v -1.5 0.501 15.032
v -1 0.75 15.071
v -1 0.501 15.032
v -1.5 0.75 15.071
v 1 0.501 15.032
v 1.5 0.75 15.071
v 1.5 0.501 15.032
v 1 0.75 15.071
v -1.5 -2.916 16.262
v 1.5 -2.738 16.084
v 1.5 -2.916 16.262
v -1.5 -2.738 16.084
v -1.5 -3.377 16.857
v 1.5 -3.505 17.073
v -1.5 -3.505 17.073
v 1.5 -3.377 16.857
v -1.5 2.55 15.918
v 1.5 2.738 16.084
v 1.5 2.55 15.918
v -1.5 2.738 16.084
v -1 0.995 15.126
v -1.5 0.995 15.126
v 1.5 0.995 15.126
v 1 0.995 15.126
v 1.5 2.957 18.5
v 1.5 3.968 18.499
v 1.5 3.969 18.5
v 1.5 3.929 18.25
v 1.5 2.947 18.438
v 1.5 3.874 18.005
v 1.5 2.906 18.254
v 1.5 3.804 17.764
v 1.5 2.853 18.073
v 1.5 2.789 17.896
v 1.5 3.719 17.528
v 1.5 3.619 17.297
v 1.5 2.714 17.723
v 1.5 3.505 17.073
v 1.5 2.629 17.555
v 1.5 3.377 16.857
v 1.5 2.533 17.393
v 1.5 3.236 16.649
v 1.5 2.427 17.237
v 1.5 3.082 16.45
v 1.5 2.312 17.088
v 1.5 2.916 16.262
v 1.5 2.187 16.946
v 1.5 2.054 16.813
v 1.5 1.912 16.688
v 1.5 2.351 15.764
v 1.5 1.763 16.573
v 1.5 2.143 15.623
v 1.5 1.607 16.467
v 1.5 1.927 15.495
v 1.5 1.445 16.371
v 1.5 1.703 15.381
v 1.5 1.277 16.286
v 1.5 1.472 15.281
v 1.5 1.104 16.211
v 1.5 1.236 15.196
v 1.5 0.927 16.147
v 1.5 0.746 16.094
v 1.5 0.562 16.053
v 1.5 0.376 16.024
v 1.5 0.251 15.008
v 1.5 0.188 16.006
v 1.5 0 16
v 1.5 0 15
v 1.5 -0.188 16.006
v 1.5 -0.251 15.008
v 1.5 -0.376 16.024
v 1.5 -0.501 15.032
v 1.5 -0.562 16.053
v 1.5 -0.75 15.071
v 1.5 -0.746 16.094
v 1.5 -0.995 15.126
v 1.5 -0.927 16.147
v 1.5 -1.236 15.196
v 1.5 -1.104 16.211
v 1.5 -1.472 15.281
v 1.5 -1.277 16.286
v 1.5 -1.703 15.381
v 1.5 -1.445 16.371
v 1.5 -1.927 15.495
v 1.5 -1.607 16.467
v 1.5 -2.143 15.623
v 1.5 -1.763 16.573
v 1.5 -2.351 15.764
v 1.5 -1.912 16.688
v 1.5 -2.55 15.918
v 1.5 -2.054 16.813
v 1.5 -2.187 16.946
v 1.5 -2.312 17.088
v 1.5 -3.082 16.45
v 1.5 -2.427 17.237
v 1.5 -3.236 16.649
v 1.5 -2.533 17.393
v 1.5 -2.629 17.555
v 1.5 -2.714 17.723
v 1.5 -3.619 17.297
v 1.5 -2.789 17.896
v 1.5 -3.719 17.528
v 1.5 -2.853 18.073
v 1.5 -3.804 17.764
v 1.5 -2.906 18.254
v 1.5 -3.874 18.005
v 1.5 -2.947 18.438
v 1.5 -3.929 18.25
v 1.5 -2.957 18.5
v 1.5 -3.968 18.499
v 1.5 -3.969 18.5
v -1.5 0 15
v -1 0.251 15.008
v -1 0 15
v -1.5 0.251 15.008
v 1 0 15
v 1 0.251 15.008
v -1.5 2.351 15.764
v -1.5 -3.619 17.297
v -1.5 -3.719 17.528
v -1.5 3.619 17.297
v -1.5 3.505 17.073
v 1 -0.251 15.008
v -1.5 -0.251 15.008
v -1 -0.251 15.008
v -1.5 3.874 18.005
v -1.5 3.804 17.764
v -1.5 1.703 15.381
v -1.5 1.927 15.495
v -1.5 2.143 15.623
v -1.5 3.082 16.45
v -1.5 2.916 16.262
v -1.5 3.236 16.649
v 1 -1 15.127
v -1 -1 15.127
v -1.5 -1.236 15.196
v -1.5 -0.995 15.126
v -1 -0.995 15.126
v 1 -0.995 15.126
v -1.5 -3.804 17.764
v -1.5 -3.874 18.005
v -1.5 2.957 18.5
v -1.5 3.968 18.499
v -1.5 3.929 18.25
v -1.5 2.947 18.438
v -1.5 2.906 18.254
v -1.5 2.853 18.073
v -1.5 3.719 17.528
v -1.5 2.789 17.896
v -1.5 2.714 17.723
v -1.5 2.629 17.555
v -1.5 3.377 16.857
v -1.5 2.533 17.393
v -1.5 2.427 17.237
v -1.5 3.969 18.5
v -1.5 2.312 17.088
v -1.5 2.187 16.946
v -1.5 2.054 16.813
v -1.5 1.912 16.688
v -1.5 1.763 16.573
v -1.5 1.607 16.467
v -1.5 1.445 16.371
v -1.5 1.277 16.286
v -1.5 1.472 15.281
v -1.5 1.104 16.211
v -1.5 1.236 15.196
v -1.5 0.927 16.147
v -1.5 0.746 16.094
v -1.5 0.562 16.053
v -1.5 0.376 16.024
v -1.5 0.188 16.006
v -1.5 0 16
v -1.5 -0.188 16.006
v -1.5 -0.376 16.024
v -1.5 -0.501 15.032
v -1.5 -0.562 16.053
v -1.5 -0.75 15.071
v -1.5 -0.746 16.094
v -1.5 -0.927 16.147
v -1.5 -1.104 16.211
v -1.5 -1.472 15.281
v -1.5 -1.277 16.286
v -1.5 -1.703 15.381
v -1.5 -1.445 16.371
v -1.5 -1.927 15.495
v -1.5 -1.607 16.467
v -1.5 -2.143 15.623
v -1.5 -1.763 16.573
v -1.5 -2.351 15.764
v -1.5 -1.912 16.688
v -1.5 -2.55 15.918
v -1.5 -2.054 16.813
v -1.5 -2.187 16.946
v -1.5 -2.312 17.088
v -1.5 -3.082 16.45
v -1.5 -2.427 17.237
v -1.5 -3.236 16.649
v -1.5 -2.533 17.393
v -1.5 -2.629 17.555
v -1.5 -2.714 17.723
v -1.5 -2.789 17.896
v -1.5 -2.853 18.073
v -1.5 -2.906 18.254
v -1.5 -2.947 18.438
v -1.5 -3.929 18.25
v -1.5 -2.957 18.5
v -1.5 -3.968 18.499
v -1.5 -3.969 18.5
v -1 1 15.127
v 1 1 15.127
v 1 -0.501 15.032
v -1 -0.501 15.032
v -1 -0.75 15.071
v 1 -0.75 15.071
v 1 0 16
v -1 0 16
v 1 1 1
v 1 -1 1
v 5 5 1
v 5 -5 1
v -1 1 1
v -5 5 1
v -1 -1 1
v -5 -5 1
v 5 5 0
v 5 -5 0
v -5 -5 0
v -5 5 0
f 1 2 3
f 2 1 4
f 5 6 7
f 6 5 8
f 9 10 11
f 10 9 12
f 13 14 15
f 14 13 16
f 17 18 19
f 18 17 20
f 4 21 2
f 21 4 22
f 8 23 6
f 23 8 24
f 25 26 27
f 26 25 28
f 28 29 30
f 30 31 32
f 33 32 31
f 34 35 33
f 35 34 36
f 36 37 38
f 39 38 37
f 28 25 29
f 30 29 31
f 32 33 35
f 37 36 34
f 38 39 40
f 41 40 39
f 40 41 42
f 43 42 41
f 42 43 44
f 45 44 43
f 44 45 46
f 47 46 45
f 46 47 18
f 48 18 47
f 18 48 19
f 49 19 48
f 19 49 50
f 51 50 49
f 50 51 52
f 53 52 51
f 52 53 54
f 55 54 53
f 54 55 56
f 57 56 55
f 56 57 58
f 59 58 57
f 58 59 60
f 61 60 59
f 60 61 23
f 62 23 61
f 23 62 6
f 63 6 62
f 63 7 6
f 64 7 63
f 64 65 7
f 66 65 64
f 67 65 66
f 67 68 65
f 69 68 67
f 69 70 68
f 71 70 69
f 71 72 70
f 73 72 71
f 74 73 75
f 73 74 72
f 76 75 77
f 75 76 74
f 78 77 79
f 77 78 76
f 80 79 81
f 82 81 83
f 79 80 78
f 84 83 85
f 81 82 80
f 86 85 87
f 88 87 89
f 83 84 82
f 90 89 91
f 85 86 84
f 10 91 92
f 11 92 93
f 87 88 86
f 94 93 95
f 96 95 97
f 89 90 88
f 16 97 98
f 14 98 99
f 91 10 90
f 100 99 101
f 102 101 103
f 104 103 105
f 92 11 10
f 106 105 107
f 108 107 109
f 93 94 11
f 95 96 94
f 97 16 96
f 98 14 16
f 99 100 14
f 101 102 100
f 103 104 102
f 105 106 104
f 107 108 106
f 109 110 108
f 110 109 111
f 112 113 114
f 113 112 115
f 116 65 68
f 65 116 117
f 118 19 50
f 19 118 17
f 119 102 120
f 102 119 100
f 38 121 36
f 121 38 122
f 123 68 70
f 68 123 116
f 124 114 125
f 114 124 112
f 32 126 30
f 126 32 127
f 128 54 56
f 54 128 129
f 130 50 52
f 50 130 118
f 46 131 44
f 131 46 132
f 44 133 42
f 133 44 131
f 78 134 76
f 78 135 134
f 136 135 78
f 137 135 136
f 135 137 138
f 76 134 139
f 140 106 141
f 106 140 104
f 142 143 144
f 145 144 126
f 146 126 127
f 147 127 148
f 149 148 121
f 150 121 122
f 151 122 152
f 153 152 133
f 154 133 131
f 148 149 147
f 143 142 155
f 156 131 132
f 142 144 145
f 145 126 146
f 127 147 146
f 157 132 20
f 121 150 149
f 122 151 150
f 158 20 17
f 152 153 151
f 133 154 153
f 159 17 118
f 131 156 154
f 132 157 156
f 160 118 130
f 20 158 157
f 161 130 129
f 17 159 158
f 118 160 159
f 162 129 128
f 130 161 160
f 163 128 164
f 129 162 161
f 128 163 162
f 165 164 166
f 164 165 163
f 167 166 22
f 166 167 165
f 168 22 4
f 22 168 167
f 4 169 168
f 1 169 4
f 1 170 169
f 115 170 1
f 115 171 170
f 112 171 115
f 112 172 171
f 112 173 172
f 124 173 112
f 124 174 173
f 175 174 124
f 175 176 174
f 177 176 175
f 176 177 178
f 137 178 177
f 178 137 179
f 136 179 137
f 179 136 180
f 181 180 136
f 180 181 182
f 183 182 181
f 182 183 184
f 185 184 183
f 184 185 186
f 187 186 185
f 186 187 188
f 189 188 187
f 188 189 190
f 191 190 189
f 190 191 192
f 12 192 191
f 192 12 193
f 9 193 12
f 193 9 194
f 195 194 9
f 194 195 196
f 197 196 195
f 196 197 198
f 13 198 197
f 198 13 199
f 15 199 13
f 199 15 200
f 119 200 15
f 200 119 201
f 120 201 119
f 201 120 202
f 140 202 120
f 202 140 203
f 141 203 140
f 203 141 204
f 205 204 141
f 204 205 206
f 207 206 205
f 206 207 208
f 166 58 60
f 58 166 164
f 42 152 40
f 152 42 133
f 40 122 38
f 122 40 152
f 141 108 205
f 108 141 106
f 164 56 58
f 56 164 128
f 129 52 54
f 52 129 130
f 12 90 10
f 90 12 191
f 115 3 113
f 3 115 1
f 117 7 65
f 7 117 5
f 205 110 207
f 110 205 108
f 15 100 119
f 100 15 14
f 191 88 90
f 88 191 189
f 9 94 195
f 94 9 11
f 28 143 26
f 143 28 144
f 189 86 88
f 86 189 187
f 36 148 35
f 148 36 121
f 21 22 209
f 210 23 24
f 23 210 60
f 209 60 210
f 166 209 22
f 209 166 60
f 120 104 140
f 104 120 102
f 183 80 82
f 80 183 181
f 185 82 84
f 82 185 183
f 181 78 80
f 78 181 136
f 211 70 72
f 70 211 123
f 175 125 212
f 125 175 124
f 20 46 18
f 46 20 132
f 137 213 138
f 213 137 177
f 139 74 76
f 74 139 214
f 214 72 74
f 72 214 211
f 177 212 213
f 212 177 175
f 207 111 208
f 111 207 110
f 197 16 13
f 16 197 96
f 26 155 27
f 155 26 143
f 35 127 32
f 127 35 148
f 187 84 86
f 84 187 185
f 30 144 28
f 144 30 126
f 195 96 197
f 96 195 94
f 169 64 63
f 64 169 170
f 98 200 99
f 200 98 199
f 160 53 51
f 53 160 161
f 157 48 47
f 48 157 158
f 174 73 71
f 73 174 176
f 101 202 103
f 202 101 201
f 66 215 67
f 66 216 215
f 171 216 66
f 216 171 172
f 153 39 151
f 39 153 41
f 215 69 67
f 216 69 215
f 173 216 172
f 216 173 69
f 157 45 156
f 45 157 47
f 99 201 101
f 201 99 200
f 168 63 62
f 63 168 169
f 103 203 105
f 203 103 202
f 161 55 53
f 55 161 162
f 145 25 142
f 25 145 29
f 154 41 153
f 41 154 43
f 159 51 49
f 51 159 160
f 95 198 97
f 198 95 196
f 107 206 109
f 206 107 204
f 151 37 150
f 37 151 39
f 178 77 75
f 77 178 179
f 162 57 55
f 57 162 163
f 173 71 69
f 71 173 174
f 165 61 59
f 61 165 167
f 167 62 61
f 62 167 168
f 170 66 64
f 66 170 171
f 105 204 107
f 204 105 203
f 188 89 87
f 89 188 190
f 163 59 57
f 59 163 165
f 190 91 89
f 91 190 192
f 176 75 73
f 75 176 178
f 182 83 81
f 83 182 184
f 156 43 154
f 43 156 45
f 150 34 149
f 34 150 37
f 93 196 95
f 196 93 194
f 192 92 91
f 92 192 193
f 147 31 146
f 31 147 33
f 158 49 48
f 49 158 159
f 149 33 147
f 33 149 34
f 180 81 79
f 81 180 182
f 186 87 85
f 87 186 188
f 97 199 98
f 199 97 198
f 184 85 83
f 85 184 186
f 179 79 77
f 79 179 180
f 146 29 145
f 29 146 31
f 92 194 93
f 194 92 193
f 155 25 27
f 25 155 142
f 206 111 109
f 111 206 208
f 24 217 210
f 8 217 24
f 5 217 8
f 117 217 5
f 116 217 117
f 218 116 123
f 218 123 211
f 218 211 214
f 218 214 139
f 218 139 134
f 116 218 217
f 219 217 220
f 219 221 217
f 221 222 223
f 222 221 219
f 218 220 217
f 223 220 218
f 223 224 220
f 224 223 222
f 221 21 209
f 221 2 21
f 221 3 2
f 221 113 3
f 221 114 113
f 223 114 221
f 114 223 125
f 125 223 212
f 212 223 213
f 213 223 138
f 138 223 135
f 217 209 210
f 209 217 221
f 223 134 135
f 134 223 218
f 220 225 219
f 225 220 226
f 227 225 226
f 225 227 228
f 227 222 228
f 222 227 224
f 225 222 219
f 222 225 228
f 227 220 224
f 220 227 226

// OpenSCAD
translate ([-1.5, 0, 15]) {
    difference () {
        translate([0, 0, 4]) rotate([90, 90, 90]) cylinder(h=3, d=8, $fn=100);
        translate([-1, 0, 4]) rotate([90, 90, 90]) cylinder(h=5, d=6, $fn=100);
        translate([0, -5, 3.5]) cube([3, 10, 6]);    
    }
    
    translate([0.5, -1, -14]) cube([2, 2, 15]);
    translate([-3.5, -5, -15]) cube([10, 10, 1]);
}
